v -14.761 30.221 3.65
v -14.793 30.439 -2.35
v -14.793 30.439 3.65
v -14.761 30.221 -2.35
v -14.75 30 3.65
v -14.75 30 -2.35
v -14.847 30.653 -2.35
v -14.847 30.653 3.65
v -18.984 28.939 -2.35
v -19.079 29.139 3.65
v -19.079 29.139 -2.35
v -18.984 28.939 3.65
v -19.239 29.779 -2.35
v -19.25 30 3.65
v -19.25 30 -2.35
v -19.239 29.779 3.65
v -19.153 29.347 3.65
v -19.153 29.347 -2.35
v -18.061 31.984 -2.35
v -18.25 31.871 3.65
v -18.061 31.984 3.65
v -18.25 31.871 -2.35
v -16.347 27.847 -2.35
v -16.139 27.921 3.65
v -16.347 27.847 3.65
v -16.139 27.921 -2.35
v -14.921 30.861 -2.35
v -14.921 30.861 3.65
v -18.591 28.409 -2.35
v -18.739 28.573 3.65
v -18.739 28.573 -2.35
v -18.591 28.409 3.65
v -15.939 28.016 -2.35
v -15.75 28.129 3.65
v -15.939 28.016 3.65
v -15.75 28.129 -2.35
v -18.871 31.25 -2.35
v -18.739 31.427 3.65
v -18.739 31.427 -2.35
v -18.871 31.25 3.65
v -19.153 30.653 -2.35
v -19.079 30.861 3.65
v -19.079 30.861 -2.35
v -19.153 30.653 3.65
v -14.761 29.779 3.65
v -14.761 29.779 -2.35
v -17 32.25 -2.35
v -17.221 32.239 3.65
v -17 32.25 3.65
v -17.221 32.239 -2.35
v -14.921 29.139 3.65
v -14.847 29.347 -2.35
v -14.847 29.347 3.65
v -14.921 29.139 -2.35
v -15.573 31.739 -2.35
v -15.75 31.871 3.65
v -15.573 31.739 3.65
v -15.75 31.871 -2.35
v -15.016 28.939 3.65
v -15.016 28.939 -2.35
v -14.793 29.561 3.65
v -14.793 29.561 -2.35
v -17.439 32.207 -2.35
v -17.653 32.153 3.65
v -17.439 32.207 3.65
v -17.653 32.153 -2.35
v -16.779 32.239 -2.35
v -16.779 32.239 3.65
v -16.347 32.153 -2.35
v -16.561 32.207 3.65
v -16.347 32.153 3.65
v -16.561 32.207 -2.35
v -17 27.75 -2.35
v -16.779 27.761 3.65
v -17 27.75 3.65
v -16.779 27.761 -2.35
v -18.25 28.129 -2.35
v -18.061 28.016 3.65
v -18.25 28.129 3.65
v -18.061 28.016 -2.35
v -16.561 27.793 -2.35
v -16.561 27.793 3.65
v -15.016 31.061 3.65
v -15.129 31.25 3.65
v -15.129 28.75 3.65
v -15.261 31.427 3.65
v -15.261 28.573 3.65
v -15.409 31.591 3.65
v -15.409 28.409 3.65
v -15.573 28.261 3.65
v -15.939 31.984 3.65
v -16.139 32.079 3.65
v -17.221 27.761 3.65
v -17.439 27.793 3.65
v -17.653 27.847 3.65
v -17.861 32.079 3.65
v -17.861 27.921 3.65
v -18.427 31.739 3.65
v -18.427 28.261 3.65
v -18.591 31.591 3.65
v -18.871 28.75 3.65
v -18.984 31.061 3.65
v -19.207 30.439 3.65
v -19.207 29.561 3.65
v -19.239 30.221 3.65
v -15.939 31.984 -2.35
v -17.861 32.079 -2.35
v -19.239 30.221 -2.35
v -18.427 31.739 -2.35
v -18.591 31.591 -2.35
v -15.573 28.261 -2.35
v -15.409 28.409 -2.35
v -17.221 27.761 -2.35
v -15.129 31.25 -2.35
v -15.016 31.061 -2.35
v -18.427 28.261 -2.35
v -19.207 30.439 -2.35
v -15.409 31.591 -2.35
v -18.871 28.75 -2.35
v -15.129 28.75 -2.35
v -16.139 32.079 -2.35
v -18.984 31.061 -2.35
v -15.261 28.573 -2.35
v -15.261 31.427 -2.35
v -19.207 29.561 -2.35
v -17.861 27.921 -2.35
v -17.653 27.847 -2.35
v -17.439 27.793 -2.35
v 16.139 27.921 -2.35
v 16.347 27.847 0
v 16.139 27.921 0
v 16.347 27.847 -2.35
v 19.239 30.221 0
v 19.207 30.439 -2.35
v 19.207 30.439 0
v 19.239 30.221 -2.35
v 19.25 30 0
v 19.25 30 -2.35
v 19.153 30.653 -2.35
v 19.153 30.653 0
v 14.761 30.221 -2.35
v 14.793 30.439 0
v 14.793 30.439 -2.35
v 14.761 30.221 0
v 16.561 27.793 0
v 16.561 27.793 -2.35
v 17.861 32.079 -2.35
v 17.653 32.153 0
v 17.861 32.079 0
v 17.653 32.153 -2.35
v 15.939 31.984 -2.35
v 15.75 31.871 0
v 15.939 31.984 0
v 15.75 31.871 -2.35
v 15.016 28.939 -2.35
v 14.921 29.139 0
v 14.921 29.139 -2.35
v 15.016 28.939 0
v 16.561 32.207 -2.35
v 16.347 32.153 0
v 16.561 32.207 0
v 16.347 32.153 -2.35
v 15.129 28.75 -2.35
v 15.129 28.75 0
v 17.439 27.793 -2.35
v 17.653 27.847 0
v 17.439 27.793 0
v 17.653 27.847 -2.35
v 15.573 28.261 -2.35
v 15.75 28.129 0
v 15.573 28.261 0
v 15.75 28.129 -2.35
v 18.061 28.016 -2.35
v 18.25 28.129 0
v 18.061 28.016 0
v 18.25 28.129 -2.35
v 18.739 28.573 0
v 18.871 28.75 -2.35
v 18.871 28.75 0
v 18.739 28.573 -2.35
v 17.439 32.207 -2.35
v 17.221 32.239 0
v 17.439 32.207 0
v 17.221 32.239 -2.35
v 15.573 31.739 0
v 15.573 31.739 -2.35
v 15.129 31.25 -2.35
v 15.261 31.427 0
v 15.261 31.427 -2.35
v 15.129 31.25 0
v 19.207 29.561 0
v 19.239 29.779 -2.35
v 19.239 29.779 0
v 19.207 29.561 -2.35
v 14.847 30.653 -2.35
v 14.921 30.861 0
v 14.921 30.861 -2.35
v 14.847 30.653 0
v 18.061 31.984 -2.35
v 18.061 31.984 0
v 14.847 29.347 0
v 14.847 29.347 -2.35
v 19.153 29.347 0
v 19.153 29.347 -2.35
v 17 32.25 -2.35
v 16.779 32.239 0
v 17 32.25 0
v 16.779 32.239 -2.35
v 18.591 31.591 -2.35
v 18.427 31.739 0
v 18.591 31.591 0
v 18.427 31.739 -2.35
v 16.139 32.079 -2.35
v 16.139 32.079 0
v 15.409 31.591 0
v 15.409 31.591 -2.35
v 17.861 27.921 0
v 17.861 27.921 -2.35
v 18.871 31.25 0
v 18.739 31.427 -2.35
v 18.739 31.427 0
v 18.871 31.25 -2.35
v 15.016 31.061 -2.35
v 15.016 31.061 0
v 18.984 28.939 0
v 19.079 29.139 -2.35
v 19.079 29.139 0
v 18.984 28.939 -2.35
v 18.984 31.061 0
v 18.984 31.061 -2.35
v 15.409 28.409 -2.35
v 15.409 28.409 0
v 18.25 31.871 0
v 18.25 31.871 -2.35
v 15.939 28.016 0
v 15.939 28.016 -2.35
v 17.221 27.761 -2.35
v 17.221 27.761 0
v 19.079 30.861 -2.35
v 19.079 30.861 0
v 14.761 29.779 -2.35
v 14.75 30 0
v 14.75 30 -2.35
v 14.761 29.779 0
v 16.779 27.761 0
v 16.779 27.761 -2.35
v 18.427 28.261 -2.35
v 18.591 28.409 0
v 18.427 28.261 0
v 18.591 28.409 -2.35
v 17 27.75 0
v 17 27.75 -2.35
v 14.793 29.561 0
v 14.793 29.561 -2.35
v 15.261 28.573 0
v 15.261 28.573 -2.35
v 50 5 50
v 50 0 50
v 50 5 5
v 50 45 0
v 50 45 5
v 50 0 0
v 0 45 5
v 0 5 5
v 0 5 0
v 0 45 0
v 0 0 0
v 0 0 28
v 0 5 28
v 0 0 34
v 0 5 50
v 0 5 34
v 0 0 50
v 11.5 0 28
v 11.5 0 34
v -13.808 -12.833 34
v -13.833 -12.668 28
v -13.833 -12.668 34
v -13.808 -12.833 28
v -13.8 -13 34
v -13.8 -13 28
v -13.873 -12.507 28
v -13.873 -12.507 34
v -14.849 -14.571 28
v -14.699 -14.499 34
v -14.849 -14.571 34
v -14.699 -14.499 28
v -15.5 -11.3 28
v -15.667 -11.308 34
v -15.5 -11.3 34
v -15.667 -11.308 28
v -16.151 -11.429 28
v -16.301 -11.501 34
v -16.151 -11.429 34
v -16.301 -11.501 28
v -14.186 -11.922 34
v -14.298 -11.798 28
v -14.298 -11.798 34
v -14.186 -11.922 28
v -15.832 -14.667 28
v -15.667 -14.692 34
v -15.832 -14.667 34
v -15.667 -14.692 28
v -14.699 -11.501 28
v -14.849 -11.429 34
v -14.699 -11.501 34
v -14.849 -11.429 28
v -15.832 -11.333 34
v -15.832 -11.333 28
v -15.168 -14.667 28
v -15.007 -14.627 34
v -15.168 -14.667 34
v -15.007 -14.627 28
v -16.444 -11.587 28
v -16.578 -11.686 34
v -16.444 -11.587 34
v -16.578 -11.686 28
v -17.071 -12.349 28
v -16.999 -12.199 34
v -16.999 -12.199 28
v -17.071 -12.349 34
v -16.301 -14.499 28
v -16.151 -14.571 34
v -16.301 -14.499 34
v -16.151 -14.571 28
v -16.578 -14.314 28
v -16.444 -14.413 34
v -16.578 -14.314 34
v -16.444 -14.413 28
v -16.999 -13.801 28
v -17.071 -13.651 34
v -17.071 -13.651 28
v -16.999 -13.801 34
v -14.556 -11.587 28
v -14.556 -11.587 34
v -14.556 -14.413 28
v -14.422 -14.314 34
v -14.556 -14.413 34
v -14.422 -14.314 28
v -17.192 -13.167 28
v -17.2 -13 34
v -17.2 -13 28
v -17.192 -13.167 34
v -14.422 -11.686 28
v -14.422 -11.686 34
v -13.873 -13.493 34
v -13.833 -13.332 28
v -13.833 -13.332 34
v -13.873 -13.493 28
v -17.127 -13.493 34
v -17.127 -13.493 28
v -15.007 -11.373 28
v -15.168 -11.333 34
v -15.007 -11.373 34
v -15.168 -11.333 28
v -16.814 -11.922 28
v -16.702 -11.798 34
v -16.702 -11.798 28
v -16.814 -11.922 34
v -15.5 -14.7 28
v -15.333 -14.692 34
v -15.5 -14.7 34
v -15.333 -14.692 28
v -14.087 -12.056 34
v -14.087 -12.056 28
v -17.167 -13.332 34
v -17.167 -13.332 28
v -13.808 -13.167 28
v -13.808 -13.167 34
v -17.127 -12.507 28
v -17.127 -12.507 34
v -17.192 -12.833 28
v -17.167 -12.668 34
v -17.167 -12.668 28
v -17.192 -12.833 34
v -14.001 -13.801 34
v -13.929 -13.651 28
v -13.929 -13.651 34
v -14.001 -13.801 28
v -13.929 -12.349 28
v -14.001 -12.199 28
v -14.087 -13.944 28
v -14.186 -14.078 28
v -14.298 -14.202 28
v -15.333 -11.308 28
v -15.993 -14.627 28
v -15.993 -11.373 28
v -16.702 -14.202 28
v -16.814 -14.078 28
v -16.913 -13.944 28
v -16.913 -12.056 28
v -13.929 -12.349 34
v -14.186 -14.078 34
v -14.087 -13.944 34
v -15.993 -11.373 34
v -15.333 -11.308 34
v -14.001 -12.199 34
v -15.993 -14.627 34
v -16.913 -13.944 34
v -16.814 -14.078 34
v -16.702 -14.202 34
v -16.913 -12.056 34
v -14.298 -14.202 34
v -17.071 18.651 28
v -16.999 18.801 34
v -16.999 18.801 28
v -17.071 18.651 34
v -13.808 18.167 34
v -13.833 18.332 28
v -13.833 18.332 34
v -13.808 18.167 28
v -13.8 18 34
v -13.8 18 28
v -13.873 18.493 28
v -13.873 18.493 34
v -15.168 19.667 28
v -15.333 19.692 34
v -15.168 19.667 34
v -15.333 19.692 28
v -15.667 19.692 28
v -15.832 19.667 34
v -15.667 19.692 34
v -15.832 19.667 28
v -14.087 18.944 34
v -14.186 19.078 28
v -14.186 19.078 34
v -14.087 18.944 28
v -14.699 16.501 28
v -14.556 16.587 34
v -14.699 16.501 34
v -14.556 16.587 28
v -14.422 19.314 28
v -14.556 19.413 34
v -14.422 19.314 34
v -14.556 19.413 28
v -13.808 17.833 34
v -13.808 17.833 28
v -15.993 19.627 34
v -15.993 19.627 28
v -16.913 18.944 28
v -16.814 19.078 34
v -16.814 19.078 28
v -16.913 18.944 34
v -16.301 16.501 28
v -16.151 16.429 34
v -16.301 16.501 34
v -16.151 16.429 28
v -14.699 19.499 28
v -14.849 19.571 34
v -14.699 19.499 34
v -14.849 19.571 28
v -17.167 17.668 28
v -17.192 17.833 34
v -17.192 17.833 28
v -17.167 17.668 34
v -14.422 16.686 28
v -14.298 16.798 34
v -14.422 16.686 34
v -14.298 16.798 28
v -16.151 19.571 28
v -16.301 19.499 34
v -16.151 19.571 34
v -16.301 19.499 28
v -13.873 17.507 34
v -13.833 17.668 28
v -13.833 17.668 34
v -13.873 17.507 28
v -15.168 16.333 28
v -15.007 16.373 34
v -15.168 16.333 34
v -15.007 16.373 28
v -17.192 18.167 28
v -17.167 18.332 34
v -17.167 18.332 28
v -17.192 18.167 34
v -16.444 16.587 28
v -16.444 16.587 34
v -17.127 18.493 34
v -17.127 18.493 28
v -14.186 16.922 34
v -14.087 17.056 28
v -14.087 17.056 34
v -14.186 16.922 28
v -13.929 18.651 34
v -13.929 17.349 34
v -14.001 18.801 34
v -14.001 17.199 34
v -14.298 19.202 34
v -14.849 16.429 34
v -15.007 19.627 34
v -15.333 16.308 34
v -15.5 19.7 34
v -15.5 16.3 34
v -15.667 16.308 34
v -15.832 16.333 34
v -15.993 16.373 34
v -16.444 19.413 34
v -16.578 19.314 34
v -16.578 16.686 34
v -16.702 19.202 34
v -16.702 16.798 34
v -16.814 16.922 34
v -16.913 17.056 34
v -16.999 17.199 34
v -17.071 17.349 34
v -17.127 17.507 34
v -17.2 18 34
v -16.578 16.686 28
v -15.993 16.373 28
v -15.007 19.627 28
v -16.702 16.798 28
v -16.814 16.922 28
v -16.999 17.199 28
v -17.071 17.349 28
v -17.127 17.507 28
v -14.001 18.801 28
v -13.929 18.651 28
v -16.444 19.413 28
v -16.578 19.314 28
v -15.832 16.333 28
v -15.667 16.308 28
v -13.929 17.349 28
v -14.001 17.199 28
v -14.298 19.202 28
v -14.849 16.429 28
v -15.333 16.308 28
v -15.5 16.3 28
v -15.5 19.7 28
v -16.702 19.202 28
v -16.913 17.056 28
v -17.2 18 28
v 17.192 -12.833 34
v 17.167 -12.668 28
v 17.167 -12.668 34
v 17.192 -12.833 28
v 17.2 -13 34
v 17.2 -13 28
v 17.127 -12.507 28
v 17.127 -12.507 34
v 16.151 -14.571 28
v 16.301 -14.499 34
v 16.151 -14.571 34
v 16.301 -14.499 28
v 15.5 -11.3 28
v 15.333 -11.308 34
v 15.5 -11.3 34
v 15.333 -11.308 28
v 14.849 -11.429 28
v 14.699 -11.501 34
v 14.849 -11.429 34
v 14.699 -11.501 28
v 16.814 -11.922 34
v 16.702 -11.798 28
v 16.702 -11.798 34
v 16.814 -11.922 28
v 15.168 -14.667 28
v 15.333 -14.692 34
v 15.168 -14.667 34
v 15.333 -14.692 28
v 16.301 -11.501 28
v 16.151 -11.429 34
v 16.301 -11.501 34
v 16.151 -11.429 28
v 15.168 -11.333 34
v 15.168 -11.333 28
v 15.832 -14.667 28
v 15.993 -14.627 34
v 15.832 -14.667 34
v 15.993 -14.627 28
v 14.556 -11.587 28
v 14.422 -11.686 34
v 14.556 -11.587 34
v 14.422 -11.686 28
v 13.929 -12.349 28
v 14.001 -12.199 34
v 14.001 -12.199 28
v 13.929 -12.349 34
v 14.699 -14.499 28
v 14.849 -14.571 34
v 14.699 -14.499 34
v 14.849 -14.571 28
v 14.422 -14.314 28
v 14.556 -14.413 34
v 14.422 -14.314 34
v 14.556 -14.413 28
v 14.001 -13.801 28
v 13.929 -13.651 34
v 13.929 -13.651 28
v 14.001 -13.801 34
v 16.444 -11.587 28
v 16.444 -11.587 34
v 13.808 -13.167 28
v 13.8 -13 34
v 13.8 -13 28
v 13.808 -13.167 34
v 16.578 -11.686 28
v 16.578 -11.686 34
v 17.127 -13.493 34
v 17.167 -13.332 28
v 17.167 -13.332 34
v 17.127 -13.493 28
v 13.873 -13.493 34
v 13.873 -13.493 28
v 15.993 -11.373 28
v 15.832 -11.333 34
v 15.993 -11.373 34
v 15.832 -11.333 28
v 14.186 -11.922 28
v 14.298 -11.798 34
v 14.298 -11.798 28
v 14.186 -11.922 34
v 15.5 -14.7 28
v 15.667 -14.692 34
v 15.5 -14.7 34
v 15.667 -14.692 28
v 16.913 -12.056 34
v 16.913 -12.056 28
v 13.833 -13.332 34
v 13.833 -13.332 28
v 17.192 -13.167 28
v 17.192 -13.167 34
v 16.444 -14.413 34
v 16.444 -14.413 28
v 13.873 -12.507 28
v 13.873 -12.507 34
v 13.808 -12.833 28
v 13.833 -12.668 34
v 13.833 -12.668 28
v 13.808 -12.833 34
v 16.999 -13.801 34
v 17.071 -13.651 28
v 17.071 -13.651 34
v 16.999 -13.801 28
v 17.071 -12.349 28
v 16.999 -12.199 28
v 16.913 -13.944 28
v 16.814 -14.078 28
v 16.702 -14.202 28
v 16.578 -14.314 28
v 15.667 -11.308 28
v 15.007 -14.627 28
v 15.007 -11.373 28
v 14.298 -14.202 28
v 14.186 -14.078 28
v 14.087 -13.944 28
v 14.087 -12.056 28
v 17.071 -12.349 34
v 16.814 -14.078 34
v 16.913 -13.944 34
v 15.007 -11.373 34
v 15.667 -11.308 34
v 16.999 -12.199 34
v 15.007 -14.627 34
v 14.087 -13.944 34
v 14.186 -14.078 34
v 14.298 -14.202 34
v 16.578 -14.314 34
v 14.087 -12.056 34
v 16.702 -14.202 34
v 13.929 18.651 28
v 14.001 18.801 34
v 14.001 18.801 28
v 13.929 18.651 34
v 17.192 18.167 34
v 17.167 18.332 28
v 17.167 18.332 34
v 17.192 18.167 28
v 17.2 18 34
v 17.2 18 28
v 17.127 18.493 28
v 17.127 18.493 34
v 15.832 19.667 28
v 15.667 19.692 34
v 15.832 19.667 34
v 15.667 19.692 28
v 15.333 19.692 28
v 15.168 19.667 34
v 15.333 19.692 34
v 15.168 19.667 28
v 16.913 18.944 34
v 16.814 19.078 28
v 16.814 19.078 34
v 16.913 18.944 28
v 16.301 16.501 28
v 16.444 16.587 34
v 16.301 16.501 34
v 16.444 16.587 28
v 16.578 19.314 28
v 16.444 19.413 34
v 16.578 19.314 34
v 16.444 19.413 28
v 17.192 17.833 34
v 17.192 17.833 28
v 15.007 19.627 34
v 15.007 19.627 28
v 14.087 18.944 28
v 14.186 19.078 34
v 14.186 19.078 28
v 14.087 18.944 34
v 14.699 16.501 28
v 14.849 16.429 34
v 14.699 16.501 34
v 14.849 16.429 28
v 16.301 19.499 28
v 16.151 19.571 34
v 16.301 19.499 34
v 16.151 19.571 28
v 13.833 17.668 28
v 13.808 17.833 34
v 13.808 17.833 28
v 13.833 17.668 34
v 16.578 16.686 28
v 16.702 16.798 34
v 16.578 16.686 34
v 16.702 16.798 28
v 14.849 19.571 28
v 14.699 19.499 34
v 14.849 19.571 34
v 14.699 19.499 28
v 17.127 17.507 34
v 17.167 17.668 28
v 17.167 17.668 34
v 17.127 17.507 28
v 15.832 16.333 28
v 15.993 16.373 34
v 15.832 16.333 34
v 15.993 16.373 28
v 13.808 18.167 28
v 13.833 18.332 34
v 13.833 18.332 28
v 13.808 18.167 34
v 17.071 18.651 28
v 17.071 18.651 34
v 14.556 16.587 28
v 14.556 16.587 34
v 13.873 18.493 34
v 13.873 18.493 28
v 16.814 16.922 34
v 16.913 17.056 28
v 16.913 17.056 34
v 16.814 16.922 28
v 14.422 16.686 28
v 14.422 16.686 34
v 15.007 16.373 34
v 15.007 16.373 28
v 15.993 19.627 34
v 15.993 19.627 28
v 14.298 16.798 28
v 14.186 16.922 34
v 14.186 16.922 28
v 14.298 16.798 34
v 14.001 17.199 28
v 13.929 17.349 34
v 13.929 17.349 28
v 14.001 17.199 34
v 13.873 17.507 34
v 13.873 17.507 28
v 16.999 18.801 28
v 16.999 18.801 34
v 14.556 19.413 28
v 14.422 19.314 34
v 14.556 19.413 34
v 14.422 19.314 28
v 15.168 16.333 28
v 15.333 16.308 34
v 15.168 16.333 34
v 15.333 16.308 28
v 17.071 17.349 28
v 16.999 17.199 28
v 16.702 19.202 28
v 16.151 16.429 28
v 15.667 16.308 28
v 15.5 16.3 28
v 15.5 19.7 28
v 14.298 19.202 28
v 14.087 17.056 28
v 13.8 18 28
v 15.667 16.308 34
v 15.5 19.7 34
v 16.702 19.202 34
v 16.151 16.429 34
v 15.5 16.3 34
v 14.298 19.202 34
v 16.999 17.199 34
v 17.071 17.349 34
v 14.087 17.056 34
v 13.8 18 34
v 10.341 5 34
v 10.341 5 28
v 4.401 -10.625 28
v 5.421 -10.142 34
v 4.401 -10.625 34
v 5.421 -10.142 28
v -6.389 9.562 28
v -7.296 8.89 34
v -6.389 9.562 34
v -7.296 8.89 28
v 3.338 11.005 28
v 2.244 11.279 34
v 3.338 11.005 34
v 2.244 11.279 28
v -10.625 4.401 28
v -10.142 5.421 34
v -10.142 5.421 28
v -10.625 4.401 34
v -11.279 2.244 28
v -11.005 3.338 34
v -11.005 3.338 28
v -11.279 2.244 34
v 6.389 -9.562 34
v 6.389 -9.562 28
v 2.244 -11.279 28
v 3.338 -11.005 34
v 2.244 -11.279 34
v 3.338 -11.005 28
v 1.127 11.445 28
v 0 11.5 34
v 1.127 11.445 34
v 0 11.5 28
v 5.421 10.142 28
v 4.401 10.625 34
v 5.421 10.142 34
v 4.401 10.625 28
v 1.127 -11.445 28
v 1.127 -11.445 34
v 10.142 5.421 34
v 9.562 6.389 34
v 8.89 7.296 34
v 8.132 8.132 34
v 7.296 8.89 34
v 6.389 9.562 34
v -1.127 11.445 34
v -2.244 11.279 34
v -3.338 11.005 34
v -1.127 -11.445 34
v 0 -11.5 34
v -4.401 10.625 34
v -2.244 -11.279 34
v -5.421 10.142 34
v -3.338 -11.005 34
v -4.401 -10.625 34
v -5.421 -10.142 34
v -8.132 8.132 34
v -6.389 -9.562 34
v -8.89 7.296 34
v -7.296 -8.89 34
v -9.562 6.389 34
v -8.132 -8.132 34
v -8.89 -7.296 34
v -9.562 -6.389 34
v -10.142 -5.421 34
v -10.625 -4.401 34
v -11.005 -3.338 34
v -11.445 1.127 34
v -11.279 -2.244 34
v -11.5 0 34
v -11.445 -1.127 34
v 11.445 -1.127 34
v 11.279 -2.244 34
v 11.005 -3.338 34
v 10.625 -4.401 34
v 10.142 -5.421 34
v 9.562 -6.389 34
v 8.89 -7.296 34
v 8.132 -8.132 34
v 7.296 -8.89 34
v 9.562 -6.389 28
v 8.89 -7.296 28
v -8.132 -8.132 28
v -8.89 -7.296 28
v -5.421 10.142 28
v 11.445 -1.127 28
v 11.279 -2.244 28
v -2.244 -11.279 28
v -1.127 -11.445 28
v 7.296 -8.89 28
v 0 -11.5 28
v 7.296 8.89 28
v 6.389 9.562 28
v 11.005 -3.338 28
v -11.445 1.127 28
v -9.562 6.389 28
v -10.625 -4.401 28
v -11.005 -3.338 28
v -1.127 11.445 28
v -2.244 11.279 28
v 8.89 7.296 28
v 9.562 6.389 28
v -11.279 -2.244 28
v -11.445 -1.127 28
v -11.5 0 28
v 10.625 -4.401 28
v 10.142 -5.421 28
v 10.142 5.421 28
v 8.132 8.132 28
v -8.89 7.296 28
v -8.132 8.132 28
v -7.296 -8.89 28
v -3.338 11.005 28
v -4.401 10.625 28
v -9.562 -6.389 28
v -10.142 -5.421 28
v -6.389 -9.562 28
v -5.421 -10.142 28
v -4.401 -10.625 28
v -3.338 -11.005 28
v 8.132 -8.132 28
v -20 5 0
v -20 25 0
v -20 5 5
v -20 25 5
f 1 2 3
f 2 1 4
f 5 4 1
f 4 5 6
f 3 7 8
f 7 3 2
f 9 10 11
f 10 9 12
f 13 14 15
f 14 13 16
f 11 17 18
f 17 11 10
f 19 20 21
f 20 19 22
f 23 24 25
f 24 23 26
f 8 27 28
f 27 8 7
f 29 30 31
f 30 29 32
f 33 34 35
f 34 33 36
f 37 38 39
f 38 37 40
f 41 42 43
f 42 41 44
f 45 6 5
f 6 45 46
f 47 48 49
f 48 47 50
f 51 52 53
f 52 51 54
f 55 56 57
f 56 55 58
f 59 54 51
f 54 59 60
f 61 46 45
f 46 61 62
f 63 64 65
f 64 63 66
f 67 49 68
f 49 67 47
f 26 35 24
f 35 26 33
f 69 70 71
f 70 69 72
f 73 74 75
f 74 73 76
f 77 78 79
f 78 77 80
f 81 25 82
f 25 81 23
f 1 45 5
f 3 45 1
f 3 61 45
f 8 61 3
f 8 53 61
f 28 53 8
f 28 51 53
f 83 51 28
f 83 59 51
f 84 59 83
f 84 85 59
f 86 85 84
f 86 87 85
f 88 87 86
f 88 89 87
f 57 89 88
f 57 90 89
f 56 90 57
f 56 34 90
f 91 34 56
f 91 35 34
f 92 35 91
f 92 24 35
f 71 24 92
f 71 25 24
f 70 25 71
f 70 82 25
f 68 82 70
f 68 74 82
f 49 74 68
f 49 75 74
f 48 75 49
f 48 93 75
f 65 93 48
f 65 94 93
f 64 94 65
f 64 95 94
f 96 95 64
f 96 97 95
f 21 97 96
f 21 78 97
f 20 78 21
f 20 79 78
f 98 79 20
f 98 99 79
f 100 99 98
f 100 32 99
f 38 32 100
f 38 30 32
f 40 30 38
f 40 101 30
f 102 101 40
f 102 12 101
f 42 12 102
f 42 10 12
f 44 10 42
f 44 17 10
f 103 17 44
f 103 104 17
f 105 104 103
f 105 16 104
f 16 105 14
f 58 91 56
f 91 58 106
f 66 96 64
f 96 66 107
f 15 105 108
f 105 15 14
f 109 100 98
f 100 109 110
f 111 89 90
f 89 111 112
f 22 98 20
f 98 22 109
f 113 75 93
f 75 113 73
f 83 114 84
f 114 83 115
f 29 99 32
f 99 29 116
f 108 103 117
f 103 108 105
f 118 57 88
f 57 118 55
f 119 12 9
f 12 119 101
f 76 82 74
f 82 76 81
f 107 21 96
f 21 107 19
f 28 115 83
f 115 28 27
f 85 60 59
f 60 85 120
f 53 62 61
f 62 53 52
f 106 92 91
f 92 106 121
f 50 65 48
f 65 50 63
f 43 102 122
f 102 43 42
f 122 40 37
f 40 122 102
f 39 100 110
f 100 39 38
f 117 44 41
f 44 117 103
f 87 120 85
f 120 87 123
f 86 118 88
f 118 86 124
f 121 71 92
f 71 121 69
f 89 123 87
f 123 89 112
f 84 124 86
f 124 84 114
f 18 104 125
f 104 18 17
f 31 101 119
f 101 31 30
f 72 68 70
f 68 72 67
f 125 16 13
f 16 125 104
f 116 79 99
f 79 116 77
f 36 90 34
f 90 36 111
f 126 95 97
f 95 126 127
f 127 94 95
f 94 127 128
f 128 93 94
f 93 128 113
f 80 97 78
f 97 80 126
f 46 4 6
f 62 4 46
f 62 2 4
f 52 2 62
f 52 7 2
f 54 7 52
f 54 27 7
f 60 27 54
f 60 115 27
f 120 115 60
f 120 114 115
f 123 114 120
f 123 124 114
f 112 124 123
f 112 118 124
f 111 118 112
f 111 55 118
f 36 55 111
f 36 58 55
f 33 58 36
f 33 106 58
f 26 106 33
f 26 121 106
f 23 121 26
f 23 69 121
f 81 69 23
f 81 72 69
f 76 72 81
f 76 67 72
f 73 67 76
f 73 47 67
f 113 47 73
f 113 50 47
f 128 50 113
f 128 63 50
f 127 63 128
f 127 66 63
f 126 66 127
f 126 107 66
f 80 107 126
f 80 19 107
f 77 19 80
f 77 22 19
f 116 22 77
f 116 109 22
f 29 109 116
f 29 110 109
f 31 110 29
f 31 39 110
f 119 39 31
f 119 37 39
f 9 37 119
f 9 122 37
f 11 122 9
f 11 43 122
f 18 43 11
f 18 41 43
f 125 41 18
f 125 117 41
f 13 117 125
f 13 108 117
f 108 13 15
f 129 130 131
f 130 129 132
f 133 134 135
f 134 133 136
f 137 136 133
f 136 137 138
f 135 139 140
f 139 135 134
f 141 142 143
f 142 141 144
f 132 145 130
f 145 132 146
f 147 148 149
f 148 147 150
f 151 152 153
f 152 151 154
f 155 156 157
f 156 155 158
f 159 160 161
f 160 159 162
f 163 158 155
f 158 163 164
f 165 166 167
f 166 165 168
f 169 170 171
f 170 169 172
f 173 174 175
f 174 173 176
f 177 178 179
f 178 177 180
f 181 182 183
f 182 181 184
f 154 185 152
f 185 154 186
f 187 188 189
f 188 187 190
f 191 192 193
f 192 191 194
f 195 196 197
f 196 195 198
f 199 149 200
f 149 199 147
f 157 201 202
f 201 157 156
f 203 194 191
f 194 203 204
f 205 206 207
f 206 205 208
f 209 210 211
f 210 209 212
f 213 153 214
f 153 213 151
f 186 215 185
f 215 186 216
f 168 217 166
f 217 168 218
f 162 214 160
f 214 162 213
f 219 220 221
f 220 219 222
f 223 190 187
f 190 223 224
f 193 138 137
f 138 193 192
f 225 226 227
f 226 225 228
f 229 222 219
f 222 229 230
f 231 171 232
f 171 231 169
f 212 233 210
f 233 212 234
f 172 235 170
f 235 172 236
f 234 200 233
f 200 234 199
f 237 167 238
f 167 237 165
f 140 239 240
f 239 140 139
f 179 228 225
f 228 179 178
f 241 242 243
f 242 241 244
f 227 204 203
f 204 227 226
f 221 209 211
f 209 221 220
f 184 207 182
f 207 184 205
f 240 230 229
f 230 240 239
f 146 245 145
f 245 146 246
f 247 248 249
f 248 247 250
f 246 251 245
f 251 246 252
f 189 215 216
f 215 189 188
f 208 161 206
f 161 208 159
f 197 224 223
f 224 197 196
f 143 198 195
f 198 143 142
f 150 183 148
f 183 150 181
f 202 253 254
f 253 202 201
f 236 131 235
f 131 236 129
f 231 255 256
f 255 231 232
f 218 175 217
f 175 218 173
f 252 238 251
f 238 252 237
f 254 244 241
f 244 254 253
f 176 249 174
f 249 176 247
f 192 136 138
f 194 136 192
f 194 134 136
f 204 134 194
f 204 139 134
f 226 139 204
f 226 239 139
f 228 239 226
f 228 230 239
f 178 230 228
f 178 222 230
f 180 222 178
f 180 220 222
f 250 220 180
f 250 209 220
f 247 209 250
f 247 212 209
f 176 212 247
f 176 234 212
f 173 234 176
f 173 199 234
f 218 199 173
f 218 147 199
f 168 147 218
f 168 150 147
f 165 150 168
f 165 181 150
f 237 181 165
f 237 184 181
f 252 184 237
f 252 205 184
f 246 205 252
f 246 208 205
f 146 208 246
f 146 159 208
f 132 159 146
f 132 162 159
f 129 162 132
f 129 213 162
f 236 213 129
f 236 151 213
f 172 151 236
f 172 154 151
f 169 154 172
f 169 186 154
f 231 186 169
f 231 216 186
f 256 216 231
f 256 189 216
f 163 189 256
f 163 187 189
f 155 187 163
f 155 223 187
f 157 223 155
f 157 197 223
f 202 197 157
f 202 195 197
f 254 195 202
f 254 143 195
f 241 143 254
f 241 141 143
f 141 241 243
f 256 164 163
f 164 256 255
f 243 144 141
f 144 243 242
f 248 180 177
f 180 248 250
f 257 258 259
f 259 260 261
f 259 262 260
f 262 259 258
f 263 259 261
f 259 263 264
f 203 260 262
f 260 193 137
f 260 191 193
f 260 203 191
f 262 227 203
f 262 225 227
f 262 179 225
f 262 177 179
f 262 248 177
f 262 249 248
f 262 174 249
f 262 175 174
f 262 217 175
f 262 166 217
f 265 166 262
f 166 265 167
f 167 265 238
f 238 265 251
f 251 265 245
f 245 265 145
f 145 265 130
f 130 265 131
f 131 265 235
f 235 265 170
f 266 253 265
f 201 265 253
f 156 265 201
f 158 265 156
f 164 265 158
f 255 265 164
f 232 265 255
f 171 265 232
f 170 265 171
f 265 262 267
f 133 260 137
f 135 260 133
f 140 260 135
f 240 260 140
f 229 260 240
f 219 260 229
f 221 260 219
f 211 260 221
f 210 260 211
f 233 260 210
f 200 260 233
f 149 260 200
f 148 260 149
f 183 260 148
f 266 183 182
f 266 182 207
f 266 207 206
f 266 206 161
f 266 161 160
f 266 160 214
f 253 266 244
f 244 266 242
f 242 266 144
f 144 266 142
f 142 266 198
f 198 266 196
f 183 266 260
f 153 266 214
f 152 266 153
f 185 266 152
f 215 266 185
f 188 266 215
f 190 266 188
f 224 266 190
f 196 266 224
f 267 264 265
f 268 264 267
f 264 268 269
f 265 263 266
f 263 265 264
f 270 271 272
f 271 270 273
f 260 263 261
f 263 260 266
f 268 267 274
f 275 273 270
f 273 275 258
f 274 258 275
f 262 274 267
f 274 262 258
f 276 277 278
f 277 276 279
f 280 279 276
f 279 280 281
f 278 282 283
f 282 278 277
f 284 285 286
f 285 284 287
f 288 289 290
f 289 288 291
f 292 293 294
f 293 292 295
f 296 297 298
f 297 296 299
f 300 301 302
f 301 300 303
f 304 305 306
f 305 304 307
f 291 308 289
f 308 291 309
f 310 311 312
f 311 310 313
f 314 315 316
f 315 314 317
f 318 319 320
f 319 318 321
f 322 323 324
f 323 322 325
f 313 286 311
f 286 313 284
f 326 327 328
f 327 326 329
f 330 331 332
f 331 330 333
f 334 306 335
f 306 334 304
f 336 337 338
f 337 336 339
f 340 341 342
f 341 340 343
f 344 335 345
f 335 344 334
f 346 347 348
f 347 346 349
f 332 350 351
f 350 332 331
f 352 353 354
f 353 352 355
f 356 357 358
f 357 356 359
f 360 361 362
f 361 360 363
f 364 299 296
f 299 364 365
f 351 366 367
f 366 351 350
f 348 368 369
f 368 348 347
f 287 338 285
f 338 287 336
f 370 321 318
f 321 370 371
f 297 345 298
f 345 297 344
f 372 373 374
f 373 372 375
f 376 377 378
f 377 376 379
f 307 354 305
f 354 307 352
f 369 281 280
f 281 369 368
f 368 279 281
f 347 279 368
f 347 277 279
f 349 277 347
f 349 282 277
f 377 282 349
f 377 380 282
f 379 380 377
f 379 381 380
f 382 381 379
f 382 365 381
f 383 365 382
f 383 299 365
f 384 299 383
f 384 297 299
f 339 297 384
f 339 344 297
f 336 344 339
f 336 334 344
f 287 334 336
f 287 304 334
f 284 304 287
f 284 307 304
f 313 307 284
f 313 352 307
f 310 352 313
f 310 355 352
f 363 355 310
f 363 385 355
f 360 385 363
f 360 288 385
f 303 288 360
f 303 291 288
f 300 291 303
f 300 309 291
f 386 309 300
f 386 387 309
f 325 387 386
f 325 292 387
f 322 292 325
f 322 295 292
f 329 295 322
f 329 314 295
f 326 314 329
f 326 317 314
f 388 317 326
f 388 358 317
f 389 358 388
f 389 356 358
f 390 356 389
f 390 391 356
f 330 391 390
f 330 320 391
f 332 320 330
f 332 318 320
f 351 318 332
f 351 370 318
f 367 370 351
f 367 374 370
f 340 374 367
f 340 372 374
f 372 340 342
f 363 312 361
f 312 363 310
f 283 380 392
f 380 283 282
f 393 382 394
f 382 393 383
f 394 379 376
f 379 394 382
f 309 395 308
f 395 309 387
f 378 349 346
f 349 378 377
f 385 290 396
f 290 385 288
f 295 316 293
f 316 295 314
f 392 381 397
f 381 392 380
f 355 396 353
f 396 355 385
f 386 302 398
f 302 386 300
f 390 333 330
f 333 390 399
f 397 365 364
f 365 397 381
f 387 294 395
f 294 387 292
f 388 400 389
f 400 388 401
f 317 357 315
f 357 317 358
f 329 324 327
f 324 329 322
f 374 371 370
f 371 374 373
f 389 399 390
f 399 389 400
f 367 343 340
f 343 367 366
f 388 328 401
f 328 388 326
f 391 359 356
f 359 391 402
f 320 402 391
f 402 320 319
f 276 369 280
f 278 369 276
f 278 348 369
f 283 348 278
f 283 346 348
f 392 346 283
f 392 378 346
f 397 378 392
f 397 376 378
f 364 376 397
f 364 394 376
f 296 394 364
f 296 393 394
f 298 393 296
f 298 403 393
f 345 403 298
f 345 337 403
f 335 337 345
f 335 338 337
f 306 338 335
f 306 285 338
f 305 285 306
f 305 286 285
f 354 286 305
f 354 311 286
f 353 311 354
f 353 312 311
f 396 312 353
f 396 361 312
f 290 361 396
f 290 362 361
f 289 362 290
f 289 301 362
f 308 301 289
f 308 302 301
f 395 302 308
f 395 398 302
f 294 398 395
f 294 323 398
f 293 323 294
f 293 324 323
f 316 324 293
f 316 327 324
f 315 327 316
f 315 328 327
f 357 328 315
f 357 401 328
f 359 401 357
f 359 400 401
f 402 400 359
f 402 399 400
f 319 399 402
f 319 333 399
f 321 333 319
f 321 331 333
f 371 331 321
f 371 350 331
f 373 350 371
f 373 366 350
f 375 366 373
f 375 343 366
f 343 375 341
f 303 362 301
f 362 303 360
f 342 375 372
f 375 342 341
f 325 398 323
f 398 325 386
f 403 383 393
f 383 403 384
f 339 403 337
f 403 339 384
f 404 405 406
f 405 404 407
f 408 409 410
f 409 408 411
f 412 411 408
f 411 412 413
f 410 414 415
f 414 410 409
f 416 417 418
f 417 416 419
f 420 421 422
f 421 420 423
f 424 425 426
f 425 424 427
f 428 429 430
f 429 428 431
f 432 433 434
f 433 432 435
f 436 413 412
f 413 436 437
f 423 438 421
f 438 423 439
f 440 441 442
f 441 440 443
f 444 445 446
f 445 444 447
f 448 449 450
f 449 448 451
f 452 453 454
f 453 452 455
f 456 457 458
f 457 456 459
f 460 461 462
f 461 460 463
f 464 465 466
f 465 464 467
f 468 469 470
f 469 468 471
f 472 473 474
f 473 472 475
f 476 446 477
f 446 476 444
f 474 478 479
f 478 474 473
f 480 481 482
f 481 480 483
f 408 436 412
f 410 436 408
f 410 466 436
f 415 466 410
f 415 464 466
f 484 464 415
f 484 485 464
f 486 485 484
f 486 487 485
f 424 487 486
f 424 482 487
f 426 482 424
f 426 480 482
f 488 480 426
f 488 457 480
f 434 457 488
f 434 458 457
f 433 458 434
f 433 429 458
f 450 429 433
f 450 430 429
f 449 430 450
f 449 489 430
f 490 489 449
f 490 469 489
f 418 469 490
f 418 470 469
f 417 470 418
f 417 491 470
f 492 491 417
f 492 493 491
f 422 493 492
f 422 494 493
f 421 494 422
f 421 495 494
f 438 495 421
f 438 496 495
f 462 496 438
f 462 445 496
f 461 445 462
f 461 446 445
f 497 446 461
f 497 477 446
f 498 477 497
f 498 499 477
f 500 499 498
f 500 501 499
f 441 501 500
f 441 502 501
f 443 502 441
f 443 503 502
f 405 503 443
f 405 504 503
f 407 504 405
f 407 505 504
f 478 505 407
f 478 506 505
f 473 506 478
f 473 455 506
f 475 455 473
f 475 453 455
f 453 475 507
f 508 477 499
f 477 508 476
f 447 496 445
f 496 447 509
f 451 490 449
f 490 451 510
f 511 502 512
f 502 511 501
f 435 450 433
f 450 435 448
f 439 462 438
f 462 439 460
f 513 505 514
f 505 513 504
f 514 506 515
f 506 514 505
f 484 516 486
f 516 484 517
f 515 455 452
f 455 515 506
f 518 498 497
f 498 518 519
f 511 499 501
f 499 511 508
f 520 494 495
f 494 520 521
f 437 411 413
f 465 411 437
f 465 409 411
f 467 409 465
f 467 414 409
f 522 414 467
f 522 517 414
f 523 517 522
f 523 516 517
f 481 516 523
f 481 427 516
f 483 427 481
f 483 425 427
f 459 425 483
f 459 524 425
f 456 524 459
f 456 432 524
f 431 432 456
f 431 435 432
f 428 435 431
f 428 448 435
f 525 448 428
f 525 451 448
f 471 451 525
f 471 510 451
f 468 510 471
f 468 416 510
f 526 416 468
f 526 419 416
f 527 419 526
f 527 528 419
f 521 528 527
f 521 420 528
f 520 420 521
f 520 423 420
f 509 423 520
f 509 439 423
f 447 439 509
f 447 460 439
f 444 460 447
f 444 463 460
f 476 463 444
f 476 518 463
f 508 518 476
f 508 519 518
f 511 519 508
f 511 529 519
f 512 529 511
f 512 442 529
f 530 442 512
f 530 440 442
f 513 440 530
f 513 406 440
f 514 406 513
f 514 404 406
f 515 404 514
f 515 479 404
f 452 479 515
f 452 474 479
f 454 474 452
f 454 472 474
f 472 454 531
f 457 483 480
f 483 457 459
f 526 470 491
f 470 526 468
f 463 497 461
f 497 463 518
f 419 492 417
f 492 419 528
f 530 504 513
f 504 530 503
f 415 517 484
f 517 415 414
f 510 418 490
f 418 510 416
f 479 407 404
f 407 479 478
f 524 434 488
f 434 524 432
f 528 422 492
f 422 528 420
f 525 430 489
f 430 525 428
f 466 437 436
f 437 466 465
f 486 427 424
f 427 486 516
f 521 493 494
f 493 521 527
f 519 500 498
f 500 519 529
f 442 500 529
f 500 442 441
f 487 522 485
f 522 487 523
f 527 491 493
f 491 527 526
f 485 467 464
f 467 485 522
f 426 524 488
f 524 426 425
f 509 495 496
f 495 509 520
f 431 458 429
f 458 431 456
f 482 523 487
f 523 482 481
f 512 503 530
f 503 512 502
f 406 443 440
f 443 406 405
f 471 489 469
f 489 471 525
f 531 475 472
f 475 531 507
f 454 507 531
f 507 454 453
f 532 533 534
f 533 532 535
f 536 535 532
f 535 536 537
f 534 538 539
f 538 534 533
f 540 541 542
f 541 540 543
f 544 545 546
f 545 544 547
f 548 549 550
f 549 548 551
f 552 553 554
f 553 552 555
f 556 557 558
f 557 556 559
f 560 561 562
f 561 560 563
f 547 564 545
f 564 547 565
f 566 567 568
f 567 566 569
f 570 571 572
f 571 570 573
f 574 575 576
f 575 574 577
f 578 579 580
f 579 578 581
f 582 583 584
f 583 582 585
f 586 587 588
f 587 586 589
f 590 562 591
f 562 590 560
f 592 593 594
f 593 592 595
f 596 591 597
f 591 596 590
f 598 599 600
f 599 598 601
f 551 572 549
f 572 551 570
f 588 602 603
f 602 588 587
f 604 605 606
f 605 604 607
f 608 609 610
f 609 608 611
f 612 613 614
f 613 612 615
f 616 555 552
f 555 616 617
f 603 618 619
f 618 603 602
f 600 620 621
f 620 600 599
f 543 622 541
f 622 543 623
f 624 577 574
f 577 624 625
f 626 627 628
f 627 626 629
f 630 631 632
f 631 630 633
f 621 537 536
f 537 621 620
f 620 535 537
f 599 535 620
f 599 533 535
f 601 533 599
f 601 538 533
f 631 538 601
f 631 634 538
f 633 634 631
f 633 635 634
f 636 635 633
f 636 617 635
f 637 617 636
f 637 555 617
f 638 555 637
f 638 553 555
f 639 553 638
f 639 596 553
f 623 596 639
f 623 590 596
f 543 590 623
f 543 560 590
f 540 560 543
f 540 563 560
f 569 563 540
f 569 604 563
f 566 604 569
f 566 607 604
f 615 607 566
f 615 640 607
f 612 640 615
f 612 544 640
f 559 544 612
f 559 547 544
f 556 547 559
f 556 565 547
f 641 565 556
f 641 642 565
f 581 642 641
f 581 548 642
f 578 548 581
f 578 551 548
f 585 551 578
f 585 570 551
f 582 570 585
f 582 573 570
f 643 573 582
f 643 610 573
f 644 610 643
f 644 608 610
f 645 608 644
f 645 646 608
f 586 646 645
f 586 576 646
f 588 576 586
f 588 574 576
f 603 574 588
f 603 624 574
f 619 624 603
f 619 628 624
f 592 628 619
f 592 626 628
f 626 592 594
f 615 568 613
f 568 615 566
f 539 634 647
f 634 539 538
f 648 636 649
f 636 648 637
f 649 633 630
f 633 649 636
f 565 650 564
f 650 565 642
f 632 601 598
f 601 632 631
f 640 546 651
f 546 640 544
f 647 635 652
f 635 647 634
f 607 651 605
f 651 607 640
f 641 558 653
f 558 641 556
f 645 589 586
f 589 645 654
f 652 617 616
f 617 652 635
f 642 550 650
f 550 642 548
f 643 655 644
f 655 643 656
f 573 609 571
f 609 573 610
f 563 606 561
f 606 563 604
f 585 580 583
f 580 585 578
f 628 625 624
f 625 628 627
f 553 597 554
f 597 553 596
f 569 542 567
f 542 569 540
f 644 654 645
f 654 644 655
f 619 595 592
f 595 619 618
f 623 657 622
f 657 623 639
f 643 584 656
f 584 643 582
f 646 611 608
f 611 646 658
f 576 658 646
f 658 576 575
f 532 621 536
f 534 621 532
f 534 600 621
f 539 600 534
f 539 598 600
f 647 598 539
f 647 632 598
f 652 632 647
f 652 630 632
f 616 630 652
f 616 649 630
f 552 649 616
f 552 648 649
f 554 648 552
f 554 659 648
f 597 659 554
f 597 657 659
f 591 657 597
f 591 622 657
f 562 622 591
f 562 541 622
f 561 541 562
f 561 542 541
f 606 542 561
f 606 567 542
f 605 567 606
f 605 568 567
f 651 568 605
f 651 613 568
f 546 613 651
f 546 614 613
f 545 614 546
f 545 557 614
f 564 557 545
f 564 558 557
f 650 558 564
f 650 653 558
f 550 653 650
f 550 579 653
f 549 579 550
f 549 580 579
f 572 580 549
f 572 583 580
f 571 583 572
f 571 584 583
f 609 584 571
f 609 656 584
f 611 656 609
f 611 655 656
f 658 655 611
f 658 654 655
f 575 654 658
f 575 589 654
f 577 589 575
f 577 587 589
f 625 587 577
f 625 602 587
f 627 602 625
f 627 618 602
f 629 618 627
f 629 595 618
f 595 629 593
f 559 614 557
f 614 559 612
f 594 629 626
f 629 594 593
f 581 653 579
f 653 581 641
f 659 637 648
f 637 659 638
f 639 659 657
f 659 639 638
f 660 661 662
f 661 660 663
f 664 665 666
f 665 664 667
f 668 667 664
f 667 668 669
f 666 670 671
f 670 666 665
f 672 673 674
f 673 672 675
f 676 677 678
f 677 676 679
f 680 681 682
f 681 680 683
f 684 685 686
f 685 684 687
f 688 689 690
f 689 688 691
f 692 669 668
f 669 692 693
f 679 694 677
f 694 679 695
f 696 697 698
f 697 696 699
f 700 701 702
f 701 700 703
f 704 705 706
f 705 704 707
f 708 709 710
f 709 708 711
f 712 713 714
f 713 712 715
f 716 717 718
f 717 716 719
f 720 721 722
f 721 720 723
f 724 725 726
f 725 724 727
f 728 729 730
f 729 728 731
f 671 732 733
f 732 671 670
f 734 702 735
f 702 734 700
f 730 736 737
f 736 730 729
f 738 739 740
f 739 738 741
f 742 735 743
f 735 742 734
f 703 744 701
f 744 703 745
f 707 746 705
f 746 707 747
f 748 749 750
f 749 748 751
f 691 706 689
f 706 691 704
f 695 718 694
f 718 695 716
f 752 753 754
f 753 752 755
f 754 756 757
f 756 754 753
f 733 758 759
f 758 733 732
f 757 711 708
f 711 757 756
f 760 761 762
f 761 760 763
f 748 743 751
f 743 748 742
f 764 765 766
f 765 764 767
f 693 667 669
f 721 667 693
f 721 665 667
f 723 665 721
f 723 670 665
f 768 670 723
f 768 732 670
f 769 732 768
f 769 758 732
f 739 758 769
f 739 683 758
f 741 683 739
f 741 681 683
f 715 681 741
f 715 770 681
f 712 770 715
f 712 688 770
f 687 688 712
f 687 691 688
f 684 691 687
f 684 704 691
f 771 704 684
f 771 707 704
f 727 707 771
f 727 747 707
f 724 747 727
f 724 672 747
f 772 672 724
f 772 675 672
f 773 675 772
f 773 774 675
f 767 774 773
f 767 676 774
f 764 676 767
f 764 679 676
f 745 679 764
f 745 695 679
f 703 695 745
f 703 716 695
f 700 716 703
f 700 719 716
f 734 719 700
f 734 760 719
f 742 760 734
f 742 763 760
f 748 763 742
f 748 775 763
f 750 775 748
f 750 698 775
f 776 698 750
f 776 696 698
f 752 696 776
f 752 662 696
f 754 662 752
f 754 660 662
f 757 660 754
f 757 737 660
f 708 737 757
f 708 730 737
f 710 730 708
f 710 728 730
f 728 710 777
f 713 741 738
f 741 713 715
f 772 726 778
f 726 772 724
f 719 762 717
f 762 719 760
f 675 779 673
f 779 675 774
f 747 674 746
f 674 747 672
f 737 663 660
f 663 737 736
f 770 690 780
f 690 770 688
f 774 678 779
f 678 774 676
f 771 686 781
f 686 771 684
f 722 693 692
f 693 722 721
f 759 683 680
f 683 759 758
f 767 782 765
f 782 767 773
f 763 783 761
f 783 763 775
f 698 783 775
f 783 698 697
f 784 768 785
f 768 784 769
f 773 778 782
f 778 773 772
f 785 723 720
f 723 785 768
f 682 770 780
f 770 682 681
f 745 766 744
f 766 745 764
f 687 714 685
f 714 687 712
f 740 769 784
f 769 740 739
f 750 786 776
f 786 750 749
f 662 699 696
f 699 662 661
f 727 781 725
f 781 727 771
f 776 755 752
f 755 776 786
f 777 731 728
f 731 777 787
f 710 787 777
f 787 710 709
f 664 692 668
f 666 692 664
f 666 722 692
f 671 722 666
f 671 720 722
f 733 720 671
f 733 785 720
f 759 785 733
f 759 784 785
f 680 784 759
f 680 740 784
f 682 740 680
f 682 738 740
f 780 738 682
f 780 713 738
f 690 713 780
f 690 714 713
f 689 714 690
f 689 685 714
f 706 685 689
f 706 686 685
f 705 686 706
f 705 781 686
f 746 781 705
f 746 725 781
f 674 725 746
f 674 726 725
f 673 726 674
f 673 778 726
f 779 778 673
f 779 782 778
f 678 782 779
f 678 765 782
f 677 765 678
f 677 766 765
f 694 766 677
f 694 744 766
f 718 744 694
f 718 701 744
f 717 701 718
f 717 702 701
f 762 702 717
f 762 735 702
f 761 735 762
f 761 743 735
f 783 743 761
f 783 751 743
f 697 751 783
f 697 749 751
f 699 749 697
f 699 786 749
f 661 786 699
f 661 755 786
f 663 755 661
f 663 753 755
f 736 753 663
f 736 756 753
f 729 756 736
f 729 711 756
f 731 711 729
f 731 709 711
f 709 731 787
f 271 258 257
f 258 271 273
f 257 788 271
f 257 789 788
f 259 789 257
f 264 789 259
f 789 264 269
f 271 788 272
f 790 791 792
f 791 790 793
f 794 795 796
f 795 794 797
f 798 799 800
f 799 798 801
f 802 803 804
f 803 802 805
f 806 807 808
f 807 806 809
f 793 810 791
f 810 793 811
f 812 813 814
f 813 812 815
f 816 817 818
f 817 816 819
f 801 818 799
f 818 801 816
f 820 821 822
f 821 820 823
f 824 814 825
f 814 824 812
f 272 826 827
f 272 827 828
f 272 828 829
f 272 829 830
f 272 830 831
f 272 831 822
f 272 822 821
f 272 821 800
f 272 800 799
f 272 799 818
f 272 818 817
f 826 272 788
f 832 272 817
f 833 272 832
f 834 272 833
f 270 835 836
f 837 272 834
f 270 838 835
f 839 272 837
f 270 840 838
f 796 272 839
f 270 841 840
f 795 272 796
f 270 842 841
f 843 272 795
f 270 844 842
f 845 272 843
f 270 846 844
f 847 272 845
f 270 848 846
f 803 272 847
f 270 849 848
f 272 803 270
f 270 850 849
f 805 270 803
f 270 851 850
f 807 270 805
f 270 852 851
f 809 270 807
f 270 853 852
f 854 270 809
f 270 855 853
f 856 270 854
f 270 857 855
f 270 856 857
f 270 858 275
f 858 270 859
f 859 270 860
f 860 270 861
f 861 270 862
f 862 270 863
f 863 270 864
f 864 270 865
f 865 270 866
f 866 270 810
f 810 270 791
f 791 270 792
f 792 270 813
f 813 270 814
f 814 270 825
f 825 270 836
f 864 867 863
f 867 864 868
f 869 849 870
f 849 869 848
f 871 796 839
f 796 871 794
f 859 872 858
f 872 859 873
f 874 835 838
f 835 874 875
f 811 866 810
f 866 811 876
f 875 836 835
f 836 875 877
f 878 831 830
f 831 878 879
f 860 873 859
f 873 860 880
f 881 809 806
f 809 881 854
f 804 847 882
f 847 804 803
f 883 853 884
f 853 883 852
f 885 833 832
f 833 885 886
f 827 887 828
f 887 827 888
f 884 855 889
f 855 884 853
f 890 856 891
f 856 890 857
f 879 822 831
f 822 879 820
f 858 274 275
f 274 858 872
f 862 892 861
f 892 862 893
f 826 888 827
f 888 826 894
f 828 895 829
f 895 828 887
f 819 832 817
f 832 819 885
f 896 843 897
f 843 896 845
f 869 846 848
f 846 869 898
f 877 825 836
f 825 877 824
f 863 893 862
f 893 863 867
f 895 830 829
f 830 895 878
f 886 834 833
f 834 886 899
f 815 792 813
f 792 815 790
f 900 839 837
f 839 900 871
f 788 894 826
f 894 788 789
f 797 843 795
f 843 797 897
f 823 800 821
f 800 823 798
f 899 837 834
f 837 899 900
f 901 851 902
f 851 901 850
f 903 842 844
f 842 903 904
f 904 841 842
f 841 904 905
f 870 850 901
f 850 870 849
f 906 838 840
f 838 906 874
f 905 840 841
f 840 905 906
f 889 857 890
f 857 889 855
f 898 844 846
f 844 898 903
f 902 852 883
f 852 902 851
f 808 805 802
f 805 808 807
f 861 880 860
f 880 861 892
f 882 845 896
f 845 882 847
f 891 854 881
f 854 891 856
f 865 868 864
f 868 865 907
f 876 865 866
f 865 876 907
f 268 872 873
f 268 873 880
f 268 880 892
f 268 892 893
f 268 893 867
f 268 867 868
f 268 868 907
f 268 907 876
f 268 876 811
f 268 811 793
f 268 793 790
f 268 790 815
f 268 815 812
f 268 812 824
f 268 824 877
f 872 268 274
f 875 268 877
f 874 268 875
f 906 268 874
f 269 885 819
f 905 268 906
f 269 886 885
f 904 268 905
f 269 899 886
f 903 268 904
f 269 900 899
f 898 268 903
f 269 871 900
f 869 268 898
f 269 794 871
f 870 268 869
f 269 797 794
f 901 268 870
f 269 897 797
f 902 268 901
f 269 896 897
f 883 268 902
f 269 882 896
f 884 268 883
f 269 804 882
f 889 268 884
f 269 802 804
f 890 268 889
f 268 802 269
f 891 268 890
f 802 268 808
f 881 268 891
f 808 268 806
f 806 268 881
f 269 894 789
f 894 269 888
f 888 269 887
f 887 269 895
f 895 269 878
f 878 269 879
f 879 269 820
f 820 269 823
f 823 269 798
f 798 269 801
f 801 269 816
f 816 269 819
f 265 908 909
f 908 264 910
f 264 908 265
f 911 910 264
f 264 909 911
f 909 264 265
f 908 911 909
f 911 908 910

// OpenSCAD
$fn = 128;

// --- Base Plate Dimensions ---
// X range: -25 to 25 (Width = 50)
// Y range: 0 to 45 (Depth = 45)
// Z range: 0 to 5 (Thickness = 5)
BASE_X_MIN = -25;
BASE_X_MAX = 25;
BASE_Y_MIN = 0;
BASE_Y_MAX = 45;
BASE_Z_MAX = 5;

// --- Base Plate Holes (M4) ---
// Position: x = -17, y = 30 and x = 17, y = 30
// Diameter: 4.5 mm
BASE_HOLE_X_1 = -17;
BASE_HOLE_Y_1 = 30;
BASE_HOLE_X_2 = 17;
BASE_HOLE_Y_2 = 30;
BASE_HOLE_DIAMETER = 4.5;

// --- Vertical Motor Plate Dimensions ---
// X range: -25 to 25 (Width = 50)
// Y range: 0 to 5 (Depth = 5)
// Z range: 0 to 50 (Height = 50)
// Stands on the back edge of the base (y=0)
MOTOR_X_MIN = -25;
MOTOR_X_MAX = 25;
MOTOR_Y_MAX = 5;
MOTOR_Z_MAX = 50;

// --- Motor Plate Boss Hole ---
// Diameter: 23 mm
// Centre: x = 0, z = 28 (along Y axis)
MOTOR_BOSS_DIAMETER = 23;
MOTOR_BOSS_X = 0;
MOTOR_BOSS_Z = 28;

// --- Motor Plate Screw Holes (M3) ---
// Diameter: 3.4 mm
// Pattern: 31 mm square centred on boss hole
MOTOR_SCREW_DIAMETER = 3.4;
MOTOR_SCREW_PATTERN_SIZE = 31;

// --- Gusset Dimensions ---
// Thickness: 5 mm (matches base)
// Location: Left (x = -25 to -20) and Right (x = 20 to 25)
// Shape: Right triangle in YZ plane
// Legs: 20 mm along +Y and 20 mm along +Z
// Right-angle corner: y = 5, z = 5
GUSSET_THICKNESS = 5;
GUSSET_LEG_Y = 20;
GUSSET_LEG_Z = 20;
GUSSET_CORNER_Y = 5;
GUSSET_CORNER_Z = 5;
GUSSET_LEFT_X_MIN = -25;
GUSSET_LEFT_X_MAX = -20;
GUSSET_RIGHT_X_MIN = 20;
GUSSET_RIGHT_X_MAX = 25;

// --- Build ---

module base_plate() {
    // Main block
    cube([
        BASE_X_MAX - BASE_X_MIN,
        BASE_Y_MAX - BASE_Y_MIN,
        BASE_Z_MAX
    ]);

    // Cut M4 holes
    for (i = [0, 1]) {
        translate([
            (i == 0) ? BASE_HOLE_X_1 : BASE_HOLE_X_2,
            (i == 0) ? BASE_HOLE_Y_1 : BASE_HOLE_Y_2,
            -BASE_HOLE_DIAMETER/2 - 0.1 // Extend past face
        ]) {
            cylinder(
                h = BASE_Z_MAX + 1,
                d = BASE_HOLE_DIAMETER,
                $fn = 64
            );
        }
    }
}

module motor_plate() {
    // Main block
    cube([
        MOTOR_X_MAX - MOTOR_X_MIN,
        MOTOR_Y_MAX,
        MOTOR_Z_MAX
    ]);

    // Cut Boss Hole
    translate([MOTOR_BOSS_X, 0, MOTOR_BOSS_Z]) {
        cylinder(
            h = MOTOR_Y_MAX + 1,
            d = MOTOR_BOSS_DIAMETER,
            $fn = 64
        );
    }

    // Cut Screw Holes (4 holes on 31mm square)
    // Pattern centred at (0, 2.5, 28)
    // Corners relative to center: +/- 15.5
    screw_offset = MOTOR_SCREW_PATTERN_SIZE / 2;
    
    for (i = [0, 1]) {
        for (j = [0, 1]) {
            translate([
                MOTOR_BOSS_X + (i == 0 ? -screw_offset : screw_offset),
                2.5 + (j == 0 ? -screw_offset : screw_offset), 
                MOTOR_BOSS_Z
            ]) {
                cylinder(
                    h = MOTOR_Y_MAX + 1,
                    d = MOTOR_SCREW_DIAMETER,
                    $fn = 64
                );
            }
        }
    }
}

module gusset() {
    // Right triangle in YZ plane, extruded along X
    // Right angle at (y=5, z=5).
    // Extends +Y to 25 (5+20) and +Z to 25 (5+20).
    // Thickness is along X.
    
    // Define vertices for the triangle in YZ plane
    // (y, z)
    // Corner: (5, 5)
    // Top: (5, 25)
    // Right: (25, 5)
    
    // We will use linear_extrude with polygon
    // Polygon points: (5,5), (25,5), (5,25), (5,5)
    // Note: OpenSCAD polygon expects (x, y) coordinates. 
    // Our local coords are Y, Z. So x->Y, y->Z.
    
    points = [
        [GUSSET_CORNER_Y, GUSSET_CORNER_Z],
        [GUSSET_CORNER_Y + GUSSET_LEG_Y, GUSSET_CORNER_Z],
        [GUSSET_CORNER_Y, GUSSET_CORNER_Z + GUSSET_LEG_Z]
    ];
    
    // Extrude thickness
    thickness = GUSSET_THICKNESS;
    
    // We need to place this at the correct X positions
    // Left Gusset: X from -25 to -20. Center X = -22.5.
    // Right Gusset: X from 20 to 25. Center X = 22.5.
    
    translate([GUSSET_LEFT_X_MIN, 0, 0]) {
        linear_extrude(thickness) {
            polygon(points);
        }
    }
    
    translate([GUSSET_RIGHT_X_MIN, 0, 0]) {
        linear_extrude(thickness) {
            polygon(points);
        }
    }
}

// Main Assembly
difference() {
    union() {
        base_plate();
        motor_plate();
        
        // Gussets are added as positive geometry
        // The gusset module creates two separate pieces (left and right)
        // We call it once.
        gusset();
    }
    
    // No additional cuts needed for the gussets as they are solid additions.
}
